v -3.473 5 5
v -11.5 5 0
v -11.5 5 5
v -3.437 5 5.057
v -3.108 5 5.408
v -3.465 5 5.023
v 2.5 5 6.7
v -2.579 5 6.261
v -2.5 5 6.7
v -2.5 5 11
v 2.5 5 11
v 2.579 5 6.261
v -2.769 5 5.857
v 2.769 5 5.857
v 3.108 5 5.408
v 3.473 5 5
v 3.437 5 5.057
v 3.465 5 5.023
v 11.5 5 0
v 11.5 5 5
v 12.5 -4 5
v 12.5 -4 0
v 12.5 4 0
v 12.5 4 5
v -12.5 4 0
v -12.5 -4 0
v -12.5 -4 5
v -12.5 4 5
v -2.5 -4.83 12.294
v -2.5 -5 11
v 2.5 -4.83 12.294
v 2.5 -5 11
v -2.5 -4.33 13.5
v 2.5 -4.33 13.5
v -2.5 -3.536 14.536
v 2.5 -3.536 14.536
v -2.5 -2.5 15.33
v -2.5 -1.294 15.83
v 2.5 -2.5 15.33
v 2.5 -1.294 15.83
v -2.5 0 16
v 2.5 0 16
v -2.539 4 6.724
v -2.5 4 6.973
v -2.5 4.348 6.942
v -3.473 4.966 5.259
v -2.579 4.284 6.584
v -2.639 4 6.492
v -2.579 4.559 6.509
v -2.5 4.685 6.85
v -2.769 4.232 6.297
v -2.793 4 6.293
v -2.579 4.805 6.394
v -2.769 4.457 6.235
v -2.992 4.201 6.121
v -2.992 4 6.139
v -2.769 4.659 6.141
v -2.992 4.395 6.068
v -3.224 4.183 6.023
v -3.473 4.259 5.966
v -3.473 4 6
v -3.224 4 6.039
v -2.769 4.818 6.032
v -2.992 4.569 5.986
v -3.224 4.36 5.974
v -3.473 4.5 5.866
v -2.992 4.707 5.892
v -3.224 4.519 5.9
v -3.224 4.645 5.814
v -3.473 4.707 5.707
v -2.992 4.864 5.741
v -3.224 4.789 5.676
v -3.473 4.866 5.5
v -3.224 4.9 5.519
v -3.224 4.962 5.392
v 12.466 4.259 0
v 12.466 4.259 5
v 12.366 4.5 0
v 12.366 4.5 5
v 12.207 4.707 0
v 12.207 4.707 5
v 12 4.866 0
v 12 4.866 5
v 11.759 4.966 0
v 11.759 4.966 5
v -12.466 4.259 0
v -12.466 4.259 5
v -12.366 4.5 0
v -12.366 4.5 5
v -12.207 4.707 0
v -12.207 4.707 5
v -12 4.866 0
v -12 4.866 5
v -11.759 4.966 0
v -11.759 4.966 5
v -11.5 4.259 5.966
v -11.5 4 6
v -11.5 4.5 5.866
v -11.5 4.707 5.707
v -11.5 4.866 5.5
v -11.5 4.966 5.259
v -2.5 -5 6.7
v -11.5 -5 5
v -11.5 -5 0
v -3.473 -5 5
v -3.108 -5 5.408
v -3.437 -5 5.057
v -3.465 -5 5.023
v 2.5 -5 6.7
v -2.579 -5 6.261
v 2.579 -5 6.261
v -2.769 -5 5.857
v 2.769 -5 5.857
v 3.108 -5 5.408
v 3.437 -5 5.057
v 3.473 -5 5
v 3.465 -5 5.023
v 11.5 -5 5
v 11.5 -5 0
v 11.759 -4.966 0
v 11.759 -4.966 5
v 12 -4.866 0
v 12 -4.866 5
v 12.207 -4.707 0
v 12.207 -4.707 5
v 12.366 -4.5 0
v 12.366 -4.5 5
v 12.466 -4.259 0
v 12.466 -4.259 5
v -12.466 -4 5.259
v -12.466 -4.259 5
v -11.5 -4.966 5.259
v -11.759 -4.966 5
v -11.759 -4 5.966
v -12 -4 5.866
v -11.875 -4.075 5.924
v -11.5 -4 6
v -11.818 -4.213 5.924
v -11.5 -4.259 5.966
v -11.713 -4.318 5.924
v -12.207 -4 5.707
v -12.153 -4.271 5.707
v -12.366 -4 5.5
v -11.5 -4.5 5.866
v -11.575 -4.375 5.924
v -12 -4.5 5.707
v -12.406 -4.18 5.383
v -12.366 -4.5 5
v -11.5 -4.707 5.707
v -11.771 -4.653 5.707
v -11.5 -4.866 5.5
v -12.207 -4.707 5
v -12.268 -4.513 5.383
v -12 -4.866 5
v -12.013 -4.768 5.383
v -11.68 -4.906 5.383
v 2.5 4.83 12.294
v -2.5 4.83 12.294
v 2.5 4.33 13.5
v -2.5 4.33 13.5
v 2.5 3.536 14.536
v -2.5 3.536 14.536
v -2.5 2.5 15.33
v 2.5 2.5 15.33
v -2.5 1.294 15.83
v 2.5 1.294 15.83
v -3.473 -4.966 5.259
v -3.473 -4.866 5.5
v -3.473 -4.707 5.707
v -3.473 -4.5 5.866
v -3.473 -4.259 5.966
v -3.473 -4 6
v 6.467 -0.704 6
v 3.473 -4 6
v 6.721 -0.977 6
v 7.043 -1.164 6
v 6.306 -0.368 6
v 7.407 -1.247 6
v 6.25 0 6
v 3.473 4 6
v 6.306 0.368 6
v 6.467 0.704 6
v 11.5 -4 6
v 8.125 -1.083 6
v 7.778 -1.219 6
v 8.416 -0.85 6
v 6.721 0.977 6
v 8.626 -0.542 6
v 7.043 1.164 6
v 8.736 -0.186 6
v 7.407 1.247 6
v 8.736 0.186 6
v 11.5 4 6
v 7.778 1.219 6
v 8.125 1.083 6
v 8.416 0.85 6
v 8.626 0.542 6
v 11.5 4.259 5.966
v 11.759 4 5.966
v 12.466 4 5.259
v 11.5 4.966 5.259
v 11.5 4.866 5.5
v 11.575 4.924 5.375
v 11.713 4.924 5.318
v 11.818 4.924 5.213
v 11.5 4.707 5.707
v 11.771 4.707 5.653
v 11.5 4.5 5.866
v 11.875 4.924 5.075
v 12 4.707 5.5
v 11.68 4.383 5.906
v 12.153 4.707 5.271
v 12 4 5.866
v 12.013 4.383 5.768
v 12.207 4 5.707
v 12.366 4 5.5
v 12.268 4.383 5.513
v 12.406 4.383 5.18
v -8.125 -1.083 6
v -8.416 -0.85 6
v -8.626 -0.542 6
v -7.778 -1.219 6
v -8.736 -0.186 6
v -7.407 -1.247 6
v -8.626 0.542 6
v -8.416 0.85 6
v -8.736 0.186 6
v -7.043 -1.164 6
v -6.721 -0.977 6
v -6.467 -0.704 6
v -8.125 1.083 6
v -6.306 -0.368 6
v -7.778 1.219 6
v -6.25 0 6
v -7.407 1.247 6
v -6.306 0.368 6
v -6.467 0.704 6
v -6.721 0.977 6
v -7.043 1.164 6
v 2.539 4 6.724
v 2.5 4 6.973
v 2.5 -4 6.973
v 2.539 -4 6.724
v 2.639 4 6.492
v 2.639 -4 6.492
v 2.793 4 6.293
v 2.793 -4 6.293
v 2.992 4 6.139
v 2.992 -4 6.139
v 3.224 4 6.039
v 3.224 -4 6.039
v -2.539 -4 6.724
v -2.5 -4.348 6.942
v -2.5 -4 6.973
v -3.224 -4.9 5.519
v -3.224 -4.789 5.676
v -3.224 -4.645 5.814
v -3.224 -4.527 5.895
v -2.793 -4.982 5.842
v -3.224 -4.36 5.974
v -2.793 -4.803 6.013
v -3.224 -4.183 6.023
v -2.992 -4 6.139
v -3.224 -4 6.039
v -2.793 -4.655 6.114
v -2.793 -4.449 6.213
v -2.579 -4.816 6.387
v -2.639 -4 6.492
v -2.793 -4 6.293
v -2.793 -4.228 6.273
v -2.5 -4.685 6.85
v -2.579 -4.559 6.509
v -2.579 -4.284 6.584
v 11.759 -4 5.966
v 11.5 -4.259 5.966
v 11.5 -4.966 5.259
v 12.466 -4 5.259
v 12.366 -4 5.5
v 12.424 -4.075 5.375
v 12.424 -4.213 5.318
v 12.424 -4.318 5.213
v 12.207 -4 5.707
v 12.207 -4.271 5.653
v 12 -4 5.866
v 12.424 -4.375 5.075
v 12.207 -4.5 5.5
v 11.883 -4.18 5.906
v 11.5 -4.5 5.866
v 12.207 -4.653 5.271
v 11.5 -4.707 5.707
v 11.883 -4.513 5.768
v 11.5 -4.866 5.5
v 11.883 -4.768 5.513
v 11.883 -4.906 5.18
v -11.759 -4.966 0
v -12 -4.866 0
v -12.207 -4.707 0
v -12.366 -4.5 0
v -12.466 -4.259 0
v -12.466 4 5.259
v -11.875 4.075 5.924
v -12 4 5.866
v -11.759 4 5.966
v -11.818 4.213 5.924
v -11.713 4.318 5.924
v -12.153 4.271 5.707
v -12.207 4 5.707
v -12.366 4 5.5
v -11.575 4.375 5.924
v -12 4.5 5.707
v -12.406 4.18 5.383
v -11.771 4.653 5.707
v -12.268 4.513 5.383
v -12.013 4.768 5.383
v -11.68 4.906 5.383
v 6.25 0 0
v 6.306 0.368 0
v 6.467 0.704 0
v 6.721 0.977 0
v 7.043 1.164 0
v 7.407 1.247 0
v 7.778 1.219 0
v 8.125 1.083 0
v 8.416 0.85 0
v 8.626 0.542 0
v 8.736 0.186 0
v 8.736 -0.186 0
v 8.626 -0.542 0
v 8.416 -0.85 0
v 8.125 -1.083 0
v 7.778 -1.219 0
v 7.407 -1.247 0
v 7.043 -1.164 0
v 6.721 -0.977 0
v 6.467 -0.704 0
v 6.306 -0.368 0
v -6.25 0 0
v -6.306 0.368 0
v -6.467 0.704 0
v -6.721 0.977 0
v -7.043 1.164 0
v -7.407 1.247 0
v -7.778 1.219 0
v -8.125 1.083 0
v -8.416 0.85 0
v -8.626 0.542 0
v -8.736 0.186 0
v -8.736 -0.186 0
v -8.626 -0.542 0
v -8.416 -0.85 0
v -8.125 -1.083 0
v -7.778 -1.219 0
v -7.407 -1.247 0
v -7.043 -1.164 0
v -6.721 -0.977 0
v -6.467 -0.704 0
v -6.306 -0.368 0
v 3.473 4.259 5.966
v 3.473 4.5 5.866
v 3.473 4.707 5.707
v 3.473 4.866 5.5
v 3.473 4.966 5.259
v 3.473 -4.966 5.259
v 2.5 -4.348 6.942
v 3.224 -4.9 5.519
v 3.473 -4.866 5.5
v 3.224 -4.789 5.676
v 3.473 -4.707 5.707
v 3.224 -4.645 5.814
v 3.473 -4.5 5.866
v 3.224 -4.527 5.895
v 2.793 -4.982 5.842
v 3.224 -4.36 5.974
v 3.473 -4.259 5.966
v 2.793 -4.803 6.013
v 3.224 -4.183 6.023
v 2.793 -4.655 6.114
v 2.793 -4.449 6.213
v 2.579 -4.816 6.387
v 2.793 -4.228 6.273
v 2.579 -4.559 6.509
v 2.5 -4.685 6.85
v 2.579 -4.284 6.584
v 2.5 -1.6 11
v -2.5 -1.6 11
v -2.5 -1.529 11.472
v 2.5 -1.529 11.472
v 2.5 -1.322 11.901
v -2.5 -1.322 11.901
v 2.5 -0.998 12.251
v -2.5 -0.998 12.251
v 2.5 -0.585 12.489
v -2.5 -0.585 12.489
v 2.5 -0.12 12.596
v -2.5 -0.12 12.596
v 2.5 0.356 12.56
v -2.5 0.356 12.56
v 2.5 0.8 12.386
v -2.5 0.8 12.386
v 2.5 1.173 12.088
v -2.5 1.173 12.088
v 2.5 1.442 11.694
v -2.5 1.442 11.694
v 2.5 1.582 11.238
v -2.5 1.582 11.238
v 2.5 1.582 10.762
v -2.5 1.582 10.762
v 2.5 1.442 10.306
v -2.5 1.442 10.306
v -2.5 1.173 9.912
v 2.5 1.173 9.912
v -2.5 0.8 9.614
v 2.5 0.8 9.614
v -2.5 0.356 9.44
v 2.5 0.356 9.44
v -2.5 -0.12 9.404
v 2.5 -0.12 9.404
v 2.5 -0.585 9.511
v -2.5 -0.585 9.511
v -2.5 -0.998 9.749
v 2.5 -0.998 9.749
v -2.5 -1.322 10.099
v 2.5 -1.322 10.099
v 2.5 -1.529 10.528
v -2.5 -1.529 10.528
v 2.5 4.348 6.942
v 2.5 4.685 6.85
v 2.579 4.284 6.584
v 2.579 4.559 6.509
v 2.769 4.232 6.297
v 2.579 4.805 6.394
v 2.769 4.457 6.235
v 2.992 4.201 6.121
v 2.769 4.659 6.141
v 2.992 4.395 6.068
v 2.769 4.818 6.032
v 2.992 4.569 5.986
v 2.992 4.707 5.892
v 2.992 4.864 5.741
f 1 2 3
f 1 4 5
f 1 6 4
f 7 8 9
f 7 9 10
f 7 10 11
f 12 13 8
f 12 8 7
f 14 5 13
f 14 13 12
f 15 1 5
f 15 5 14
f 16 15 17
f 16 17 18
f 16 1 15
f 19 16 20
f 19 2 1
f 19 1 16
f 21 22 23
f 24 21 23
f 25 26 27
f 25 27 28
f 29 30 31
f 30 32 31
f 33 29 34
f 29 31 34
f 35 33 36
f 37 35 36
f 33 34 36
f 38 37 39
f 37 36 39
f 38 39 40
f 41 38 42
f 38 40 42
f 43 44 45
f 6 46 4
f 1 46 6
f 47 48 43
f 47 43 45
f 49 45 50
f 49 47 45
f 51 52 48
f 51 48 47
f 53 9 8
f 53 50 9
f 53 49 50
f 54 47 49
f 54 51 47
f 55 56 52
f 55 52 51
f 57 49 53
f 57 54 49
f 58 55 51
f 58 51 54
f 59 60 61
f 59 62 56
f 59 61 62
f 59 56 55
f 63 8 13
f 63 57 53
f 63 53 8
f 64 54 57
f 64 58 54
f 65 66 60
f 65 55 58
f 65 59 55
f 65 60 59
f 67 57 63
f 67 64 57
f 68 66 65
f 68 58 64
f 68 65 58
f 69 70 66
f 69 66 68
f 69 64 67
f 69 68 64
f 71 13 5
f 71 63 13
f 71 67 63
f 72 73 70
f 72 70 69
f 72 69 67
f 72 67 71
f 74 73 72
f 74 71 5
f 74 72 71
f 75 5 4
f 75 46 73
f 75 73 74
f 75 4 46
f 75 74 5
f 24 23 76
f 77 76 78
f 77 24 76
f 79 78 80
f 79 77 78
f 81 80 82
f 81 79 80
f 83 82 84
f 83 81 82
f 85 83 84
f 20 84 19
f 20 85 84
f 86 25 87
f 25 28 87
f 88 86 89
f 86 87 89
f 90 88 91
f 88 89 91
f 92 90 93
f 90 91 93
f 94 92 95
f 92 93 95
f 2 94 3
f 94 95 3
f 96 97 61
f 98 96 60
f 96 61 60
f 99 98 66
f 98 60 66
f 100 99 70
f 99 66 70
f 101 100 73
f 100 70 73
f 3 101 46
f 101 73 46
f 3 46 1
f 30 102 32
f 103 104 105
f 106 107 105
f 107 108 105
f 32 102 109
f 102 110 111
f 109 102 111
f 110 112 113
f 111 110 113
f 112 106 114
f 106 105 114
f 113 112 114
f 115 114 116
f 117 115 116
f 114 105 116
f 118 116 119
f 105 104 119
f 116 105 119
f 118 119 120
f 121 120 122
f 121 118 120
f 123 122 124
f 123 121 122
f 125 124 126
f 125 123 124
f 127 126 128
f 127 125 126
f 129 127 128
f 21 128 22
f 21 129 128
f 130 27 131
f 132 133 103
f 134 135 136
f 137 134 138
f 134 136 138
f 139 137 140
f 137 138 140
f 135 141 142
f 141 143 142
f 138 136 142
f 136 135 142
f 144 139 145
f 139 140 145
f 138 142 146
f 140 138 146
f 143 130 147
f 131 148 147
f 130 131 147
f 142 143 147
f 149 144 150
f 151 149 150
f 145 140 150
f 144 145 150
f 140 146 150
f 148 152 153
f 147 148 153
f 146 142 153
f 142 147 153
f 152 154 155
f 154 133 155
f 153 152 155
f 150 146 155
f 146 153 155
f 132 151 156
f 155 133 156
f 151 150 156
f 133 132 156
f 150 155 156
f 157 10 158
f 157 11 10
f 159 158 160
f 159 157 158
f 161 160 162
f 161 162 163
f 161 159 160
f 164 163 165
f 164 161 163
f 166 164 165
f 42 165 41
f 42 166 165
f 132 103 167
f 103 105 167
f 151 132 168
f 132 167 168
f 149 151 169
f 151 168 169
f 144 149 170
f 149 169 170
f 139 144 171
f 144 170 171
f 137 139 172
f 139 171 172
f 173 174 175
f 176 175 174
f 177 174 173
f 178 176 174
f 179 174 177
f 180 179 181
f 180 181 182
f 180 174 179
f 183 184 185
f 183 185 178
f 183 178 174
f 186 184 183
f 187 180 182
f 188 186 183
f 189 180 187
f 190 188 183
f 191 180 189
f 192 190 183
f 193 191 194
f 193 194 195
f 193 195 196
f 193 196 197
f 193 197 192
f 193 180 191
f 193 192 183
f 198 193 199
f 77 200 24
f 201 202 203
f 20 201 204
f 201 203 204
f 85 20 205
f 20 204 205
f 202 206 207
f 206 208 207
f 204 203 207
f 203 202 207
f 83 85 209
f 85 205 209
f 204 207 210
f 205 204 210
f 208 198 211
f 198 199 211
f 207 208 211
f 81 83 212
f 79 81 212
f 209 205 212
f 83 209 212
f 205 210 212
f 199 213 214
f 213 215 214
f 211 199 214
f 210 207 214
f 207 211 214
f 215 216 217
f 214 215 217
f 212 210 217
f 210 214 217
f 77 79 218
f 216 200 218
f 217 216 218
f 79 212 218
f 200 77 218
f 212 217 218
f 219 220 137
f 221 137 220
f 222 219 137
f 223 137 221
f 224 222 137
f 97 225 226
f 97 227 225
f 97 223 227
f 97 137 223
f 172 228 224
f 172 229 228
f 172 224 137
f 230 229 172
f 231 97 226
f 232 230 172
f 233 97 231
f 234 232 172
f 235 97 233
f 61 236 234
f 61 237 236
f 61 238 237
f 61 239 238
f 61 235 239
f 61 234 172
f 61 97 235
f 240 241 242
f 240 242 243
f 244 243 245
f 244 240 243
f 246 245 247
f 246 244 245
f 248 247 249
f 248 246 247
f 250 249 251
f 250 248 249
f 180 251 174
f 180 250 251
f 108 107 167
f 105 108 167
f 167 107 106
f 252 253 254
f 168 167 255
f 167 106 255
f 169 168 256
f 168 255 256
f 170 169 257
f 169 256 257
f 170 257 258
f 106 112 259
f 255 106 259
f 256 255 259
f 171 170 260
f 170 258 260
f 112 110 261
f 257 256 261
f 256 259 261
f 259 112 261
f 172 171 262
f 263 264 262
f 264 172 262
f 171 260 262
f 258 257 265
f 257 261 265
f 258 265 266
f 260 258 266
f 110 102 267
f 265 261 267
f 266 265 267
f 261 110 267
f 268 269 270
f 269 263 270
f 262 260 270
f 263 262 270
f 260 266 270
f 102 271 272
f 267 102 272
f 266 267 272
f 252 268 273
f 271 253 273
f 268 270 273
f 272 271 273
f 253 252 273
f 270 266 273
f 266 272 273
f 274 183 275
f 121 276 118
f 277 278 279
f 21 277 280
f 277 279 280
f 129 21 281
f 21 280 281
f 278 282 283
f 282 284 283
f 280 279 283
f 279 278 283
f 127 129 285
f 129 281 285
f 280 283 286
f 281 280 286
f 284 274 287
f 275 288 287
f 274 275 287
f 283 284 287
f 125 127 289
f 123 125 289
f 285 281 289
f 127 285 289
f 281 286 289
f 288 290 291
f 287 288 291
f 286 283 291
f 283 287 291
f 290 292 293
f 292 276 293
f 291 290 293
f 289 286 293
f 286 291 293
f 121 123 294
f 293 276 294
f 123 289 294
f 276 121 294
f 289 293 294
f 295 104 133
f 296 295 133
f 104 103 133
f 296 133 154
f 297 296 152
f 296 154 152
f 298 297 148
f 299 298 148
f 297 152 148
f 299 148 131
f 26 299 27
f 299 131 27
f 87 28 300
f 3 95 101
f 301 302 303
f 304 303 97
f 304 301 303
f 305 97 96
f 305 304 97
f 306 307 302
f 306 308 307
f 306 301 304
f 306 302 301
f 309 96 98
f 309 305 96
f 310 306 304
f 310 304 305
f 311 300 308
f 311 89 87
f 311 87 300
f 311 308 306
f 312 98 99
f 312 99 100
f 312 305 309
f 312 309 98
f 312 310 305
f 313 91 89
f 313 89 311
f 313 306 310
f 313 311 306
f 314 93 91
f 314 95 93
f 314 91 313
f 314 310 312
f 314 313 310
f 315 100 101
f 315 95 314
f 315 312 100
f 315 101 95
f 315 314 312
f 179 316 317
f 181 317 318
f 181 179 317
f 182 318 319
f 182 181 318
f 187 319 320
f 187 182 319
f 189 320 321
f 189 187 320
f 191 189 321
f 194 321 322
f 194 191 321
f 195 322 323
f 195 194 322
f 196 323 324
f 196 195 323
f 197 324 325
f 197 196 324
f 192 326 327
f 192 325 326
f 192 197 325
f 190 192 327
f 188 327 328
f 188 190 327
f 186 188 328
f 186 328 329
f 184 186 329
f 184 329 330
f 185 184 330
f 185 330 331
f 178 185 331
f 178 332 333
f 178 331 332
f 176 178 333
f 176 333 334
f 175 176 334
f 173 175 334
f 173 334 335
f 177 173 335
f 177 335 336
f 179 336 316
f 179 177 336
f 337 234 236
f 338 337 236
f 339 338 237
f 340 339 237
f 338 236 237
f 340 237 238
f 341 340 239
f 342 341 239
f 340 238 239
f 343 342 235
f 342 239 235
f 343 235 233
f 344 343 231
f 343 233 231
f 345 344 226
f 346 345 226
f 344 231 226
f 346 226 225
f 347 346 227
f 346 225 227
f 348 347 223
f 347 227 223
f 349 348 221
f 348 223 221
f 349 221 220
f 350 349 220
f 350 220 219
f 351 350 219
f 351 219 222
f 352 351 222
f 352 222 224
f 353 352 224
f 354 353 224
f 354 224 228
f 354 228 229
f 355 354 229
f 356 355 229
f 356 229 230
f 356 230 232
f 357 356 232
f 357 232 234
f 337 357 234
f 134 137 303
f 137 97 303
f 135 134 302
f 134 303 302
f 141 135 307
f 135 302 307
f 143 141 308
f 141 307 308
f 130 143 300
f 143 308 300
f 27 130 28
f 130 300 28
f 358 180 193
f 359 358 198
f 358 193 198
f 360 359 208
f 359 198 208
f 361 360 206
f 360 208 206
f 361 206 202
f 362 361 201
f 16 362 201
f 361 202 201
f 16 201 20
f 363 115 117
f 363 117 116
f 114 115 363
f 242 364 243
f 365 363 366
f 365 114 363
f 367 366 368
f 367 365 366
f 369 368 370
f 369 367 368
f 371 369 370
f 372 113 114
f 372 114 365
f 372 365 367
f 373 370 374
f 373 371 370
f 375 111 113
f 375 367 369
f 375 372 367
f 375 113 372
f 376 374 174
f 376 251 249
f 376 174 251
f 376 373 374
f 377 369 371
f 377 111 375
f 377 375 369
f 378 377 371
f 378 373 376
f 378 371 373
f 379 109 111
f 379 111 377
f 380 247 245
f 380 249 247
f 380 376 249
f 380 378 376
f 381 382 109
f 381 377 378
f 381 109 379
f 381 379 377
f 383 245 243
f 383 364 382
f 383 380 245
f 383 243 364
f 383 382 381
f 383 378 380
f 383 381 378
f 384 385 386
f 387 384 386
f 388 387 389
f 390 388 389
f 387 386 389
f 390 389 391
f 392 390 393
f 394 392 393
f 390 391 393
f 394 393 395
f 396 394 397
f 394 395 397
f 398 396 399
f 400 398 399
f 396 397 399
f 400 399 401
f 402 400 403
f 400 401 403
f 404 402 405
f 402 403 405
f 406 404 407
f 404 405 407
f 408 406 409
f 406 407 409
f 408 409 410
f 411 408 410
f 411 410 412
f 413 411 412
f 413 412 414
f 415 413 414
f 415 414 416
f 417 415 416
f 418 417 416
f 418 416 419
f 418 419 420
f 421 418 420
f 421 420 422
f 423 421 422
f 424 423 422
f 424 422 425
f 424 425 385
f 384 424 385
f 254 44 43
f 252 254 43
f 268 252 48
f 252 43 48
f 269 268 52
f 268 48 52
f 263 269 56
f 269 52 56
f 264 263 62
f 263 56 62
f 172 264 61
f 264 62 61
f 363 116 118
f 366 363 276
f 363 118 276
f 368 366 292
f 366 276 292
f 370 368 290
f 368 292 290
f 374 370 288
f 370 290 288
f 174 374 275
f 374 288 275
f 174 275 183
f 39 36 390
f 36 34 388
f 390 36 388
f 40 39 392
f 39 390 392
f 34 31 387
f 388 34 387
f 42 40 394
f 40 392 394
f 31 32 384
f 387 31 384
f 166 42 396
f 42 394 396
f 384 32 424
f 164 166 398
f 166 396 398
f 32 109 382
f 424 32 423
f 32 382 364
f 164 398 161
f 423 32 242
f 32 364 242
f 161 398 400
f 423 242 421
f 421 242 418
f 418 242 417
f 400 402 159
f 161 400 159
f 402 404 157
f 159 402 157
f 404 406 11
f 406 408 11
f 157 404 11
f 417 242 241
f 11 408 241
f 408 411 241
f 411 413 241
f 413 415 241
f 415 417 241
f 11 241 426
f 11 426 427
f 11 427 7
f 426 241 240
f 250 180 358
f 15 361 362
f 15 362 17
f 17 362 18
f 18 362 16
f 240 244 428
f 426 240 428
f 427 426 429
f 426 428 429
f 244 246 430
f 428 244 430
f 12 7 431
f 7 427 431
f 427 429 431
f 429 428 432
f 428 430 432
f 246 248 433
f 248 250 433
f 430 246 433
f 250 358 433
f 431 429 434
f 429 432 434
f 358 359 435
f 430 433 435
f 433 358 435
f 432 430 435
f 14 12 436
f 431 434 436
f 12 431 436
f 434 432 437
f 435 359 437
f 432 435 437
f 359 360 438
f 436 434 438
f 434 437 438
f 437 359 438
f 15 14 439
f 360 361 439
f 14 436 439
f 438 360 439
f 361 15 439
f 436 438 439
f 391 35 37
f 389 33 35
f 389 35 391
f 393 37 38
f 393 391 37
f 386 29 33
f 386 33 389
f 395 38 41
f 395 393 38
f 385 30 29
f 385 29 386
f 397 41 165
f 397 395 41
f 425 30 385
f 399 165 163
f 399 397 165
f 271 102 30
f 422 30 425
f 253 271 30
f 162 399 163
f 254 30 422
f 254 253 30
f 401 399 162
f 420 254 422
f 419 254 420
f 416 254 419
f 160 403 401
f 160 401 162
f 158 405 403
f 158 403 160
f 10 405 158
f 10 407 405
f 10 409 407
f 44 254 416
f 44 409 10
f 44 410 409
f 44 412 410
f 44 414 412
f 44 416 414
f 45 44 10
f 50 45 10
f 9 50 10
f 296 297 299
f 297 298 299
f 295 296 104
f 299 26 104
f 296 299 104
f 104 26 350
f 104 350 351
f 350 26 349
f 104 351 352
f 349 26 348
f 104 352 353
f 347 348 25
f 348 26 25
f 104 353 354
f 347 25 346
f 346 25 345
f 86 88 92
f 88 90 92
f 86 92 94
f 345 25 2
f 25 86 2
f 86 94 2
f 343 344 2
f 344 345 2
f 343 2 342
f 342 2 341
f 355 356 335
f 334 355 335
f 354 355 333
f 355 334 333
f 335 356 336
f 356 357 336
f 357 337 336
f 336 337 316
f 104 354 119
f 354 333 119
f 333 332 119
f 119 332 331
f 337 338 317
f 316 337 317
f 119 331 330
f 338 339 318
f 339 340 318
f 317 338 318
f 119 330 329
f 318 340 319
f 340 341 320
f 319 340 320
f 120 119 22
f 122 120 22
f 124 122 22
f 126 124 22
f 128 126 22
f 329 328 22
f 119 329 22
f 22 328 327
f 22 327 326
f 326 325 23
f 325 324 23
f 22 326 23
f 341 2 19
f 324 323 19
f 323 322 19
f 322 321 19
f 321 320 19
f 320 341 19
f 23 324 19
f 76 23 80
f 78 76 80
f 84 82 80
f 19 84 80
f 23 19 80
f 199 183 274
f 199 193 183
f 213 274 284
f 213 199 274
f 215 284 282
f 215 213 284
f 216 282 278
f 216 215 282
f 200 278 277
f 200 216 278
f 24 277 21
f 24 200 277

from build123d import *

# Parameters (mm, degrees)
F0_W          = 25
F0_H          = 10
F1_DEPTH      = 6
F2_W          = 5
F2_H          = 10
F3_DEPTH      = 10
F4_R          = 1.25
F5_DEPTH      = 6.001
F6_R          = 4.99999
F7_R          = 1.6
F8_DEPTH      = 15.001
F9_R          = 1
F10_T1_DEPTH  = 8
F10_T6_ANGLE  = 233.435380504
F10_T11_ANGLE = 233.435380504
F10_T16_ANGLE = 233.435380504
F10_T21_ANGLE = 233.435380504


# Not quite as in the source:
# - a fillet or chamfer that OpenCascade refuses, or shapes differently, is made with other operations: its cross-section is extruded or revolved along the edge and cut away or added
# - a fillet or chamfer is up to 0.001 mm smaller than in the source, because OpenCascade refuses the exact size
# - a pattern or mirror of a feature is missing from the dataset's text; its kind, count and spacing are read off the source's solid


with BuildPart() as f1:
    # F0 (on Top) → F1 (new body)
    with BuildSketch(Plane.XY):
        Rectangle(F0_W, F0_H)
    extrude(amount=F1_DEPTH)

    # F2 (on face) → F3 (join)
    with BuildSketch(Plane.XY.offset(6)):
        Rectangle(F2_W, F2_H)
    extrude(amount=F3_DEPTH)

    # F4 (on face) → F5 (cut, through all)
    with BuildSketch(Plane.XY.offset(6)):
        with Locations((-7.5, 0)):
            Circle(F4_R)
    f5 = extrude(amount=-F5_DEPTH, mode=Mode.SUBTRACT)

    # F5_copies: F5 across plane
    add(f5.mirror(Plane(origin=(0, 0, 0), x_dir=(0, 0, 1), z_dir=(1, 0, 0))), mode=Mode.SUBTRACT)

    # F6 (radius 5 in the source; OpenCascade refuses exactly that, so slightly less here)
    f6_edges = [f1.edges().sort_by_distance(p)[0] for p in [
        (0, -5, 16),
        (0, 5, 16),
    ]]
    fillet(f6_edges, radius=F6_R)

    # F7 (on face) → F8 (cut, through all)
    with BuildSketch(Plane(origin=(-2.5, 0, 0), x_dir=(0, -1, 0), z_dir=(-1, 0, 0))):
        with Locations((0, 11)):
            Circle(F7_R)
    extrude(amount=-F8_DEPTH, mode=Mode.SUBTRACT)

    # F9
    f9_edges = [f1.edges().sort_by_distance(p)[0] for p in [
        (7.5, -5, 6),
        (12.5, 0, 6),
        (7.5, 5, 6),
        (12.5, -5, 3),
        (12.5, 5, 3),
        (-12.5, -5, 3),
        (-12.5, 5, 3),
        (-12.5, 0, 6),
        (-7.5, -5, 6),
        (-7.5, 5, 6),
    ]]
    fillet(f9_edges, radius=F9_R)

    # F10: fillet of radius 1 on 2 edges, made by hand

    # F10_s2 → F10_t1 (join)
    with BuildSketch(Plane.XZ.offset(-4)):
        with BuildLine():
            ThreePointArc((2.4996, 7.0009656854), (2.7928932188, 6.2928932188), (3.5009656854, 5.9996))
            Line((3.5009656854, 5.9996), (3.5009656854, 5.8994634315))
            ThreePointArc((3.5009656854, 5.8994634315), (3.0004828427, 5.8998634315), (2.5, 5.8998634315))
            Line((2.5, 5.8998634315), (2.3998634315, 6))
            ThreePointArc((2.3998634315, 6), (2.3998634315, 6.5004828427), (2.3994634315, 7.0009656854))
            Line((2.3994634315, 7.0009656854), (2.4996, 7.0009656854))
        make_face()
        with BuildLine():
            ThreePointArc((-2.4996, 7.0009656854), (-2.7928932188, 6.2928932188), (-3.5009656854, 5.9996))
            Line((-3.5009656854, 5.9996), (-3.5009656854, 5.8994634315))
            ThreePointArc((-3.5009656854, 5.8994634315), (-3.0004828427, 5.8998634315), (-2.5, 5.8998634315))
            Line((-2.5, 5.8998634315), (-2.3998634315, 6))
            ThreePointArc((-2.3998634315, 6), (-2.3998634315, 6.5004828427), (-2.3994634315, 7.0009656854))
            Line((-2.3994634315, 7.0009656854), (-2.4996, 7.0009656854))
        make_face()
    extrude(amount=F10_T1_DEPTH)


with BuildPart() as f10_tool4:
    # F10_s5 → F10_t6 (revolve)
    with BuildSketch(Plane.XZ.offset(-4)):
        with BuildLine():
            ThreePointArc((-2.4996, 7.0009656854), (-2.7928932188, 6.2928932188), (-3.5009656854, 5.9996))
            Line((-3.5009656854, 5.9996), (-3.5009656854, 5.8994634315))
            ThreePointArc((-3.5009656854, 5.8994634315), (-3.0004828427, 5.8998634315), (-2.5, 5.8998634315))
            Line((-2.5, 5.8998634315), (-2.3998634315, 6))
            ThreePointArc((-2.3998634315, 6), (-2.3998634315, 6.5004828427), (-2.3994634315, 7.0009656854))
            Line((-2.3994634315, 7.0009656854), (-2.4996, 7.0009656854))
        make_face()
    revolve(axis=Axis((-2.5, 4, 5), (-1, 0, 0)), revolution_arc=F10_T6_ANGLE)

    split(bisect_by=Plane.XZ.offset(-5), keep=Keep.TOP)


with BuildPart() as f1_1:
    add(f1.part)

    # F10_t3: union F10_tool4
    add(f10_tool4.part)


with BuildPart() as f10_tool9:
    # F10_s10 → F10_t11 (revolve)
    with BuildSketch(Plane(origin=(0, 0.9728322798, 1.3116110753), x_dir=(1, 0, 0), z_dir=(0, 0.5957290165, 0.8031854947))):
        with BuildLine():
            ThreePointArc((-3.5009656854, -5.1917870613), (-2.7928932188, -4.8984938425), (-2.4996, -4.1904213759))
            Line((-2.4996, -4.1904213759), (-2.3994634315, -4.1904213759))
            ThreePointArc((-2.3994634315, -4.1904213759), (-2.3998634315, -4.6909042186), (-2.3998634315, -5.1913870613))
            Line((-2.3998634315, -5.1913870613), (-2.5, -5.2915236298))
            ThreePointArc((-2.5, -5.2915236298), (-3.0004828427, -5.2915236298), (-3.5009656854, -5.2919236298))
            Line((-3.5009656854, -5.2919236298), (-3.5009656854, -5.1917870613))
        make_face()
    revolve(axis=Axis((-2.5, -4, 5), (-1, 0, 0)), revolution_arc=F10_T11_ANGLE)

    split(bisect_by=Plane.XZ.offset(5), keep=Keep.BOTTOM)


with BuildPart() as f1_2:
    add(f1_1.part)

    # F10_t8: union F10_tool9
    add(f10_tool9.part)


with BuildPart() as f10_tool14:
    # F10_s15 → F10_t16 (revolve)
    with BuildSketch(Plane(origin=(0, 0.9728322798, 1.3116110753), x_dir=(1, 0, 0), z_dir=(0, 0.5957290165, 0.8031854947))):
        with BuildLine():
            ThreePointArc((3.5009656854, -5.1917870613), (2.7928932188, -4.8984938425), (2.4996, -4.1904213759))
            Line((2.4996, -4.1904213759), (2.3994634315, -4.1904213759))
            ThreePointArc((2.3994634315, -4.1904213759), (2.3998634315, -4.6909042186), (2.3998634315, -5.1913870613))
            Line((2.3998634315, -5.1913870613), (2.5, -5.2915236298))
            ThreePointArc((2.5, -5.2915236298), (3.0004828427, -5.2915236298), (3.5009656854, -5.2919236298))
            Line((3.5009656854, -5.2919236298), (3.5009656854, -5.1917870613))
        make_face()
    revolve(axis=Axis((2.5, -4, 5), (-1, 0, 0)), revolution_arc=F10_T16_ANGLE)

    split(bisect_by=Plane.XZ.offset(5), keep=Keep.BOTTOM)


with BuildPart() as f1_3:
    add(f1_2.part)

    # F10_t13: union F10_tool14
    add(f10_tool14.part)


with BuildPart() as f10_tool19:
    # F10_s20 → F10_t21 (revolve)
    with BuildSketch(Plane.XZ.offset(-4)):
        with BuildLine():
            ThreePointArc((2.4996, 7.0009656854), (2.7928932188, 6.2928932188), (3.5009656854, 5.9996))
            Line((3.5009656854, 5.9996), (3.5009656854, 5.8994634315))
            ThreePointArc((3.5009656854, 5.8994634315), (3.0004828427, 5.8998634315), (2.5, 5.8998634315))
            Line((2.5, 5.8998634315), (2.3998634315, 6))
            ThreePointArc((2.3998634315, 6), (2.3998634315, 6.5004828427), (2.3994634315, 7.0009656854))
            Line((2.3994634315, 7.0009656854), (2.4996, 7.0009656854))
        make_face()
    revolve(axis=Axis((2.5, 4, 5), (-1, 0, 0)), revolution_arc=F10_T21_ANGLE)

    split(bisect_by=Plane.XZ.offset(-5), keep=Keep.TOP)


with BuildPart() as f1_4:
    add(f1_3.part)

    # F10_t18: union F10_tool19
    add(f10_tool19.part)


solid = f1_4.part
